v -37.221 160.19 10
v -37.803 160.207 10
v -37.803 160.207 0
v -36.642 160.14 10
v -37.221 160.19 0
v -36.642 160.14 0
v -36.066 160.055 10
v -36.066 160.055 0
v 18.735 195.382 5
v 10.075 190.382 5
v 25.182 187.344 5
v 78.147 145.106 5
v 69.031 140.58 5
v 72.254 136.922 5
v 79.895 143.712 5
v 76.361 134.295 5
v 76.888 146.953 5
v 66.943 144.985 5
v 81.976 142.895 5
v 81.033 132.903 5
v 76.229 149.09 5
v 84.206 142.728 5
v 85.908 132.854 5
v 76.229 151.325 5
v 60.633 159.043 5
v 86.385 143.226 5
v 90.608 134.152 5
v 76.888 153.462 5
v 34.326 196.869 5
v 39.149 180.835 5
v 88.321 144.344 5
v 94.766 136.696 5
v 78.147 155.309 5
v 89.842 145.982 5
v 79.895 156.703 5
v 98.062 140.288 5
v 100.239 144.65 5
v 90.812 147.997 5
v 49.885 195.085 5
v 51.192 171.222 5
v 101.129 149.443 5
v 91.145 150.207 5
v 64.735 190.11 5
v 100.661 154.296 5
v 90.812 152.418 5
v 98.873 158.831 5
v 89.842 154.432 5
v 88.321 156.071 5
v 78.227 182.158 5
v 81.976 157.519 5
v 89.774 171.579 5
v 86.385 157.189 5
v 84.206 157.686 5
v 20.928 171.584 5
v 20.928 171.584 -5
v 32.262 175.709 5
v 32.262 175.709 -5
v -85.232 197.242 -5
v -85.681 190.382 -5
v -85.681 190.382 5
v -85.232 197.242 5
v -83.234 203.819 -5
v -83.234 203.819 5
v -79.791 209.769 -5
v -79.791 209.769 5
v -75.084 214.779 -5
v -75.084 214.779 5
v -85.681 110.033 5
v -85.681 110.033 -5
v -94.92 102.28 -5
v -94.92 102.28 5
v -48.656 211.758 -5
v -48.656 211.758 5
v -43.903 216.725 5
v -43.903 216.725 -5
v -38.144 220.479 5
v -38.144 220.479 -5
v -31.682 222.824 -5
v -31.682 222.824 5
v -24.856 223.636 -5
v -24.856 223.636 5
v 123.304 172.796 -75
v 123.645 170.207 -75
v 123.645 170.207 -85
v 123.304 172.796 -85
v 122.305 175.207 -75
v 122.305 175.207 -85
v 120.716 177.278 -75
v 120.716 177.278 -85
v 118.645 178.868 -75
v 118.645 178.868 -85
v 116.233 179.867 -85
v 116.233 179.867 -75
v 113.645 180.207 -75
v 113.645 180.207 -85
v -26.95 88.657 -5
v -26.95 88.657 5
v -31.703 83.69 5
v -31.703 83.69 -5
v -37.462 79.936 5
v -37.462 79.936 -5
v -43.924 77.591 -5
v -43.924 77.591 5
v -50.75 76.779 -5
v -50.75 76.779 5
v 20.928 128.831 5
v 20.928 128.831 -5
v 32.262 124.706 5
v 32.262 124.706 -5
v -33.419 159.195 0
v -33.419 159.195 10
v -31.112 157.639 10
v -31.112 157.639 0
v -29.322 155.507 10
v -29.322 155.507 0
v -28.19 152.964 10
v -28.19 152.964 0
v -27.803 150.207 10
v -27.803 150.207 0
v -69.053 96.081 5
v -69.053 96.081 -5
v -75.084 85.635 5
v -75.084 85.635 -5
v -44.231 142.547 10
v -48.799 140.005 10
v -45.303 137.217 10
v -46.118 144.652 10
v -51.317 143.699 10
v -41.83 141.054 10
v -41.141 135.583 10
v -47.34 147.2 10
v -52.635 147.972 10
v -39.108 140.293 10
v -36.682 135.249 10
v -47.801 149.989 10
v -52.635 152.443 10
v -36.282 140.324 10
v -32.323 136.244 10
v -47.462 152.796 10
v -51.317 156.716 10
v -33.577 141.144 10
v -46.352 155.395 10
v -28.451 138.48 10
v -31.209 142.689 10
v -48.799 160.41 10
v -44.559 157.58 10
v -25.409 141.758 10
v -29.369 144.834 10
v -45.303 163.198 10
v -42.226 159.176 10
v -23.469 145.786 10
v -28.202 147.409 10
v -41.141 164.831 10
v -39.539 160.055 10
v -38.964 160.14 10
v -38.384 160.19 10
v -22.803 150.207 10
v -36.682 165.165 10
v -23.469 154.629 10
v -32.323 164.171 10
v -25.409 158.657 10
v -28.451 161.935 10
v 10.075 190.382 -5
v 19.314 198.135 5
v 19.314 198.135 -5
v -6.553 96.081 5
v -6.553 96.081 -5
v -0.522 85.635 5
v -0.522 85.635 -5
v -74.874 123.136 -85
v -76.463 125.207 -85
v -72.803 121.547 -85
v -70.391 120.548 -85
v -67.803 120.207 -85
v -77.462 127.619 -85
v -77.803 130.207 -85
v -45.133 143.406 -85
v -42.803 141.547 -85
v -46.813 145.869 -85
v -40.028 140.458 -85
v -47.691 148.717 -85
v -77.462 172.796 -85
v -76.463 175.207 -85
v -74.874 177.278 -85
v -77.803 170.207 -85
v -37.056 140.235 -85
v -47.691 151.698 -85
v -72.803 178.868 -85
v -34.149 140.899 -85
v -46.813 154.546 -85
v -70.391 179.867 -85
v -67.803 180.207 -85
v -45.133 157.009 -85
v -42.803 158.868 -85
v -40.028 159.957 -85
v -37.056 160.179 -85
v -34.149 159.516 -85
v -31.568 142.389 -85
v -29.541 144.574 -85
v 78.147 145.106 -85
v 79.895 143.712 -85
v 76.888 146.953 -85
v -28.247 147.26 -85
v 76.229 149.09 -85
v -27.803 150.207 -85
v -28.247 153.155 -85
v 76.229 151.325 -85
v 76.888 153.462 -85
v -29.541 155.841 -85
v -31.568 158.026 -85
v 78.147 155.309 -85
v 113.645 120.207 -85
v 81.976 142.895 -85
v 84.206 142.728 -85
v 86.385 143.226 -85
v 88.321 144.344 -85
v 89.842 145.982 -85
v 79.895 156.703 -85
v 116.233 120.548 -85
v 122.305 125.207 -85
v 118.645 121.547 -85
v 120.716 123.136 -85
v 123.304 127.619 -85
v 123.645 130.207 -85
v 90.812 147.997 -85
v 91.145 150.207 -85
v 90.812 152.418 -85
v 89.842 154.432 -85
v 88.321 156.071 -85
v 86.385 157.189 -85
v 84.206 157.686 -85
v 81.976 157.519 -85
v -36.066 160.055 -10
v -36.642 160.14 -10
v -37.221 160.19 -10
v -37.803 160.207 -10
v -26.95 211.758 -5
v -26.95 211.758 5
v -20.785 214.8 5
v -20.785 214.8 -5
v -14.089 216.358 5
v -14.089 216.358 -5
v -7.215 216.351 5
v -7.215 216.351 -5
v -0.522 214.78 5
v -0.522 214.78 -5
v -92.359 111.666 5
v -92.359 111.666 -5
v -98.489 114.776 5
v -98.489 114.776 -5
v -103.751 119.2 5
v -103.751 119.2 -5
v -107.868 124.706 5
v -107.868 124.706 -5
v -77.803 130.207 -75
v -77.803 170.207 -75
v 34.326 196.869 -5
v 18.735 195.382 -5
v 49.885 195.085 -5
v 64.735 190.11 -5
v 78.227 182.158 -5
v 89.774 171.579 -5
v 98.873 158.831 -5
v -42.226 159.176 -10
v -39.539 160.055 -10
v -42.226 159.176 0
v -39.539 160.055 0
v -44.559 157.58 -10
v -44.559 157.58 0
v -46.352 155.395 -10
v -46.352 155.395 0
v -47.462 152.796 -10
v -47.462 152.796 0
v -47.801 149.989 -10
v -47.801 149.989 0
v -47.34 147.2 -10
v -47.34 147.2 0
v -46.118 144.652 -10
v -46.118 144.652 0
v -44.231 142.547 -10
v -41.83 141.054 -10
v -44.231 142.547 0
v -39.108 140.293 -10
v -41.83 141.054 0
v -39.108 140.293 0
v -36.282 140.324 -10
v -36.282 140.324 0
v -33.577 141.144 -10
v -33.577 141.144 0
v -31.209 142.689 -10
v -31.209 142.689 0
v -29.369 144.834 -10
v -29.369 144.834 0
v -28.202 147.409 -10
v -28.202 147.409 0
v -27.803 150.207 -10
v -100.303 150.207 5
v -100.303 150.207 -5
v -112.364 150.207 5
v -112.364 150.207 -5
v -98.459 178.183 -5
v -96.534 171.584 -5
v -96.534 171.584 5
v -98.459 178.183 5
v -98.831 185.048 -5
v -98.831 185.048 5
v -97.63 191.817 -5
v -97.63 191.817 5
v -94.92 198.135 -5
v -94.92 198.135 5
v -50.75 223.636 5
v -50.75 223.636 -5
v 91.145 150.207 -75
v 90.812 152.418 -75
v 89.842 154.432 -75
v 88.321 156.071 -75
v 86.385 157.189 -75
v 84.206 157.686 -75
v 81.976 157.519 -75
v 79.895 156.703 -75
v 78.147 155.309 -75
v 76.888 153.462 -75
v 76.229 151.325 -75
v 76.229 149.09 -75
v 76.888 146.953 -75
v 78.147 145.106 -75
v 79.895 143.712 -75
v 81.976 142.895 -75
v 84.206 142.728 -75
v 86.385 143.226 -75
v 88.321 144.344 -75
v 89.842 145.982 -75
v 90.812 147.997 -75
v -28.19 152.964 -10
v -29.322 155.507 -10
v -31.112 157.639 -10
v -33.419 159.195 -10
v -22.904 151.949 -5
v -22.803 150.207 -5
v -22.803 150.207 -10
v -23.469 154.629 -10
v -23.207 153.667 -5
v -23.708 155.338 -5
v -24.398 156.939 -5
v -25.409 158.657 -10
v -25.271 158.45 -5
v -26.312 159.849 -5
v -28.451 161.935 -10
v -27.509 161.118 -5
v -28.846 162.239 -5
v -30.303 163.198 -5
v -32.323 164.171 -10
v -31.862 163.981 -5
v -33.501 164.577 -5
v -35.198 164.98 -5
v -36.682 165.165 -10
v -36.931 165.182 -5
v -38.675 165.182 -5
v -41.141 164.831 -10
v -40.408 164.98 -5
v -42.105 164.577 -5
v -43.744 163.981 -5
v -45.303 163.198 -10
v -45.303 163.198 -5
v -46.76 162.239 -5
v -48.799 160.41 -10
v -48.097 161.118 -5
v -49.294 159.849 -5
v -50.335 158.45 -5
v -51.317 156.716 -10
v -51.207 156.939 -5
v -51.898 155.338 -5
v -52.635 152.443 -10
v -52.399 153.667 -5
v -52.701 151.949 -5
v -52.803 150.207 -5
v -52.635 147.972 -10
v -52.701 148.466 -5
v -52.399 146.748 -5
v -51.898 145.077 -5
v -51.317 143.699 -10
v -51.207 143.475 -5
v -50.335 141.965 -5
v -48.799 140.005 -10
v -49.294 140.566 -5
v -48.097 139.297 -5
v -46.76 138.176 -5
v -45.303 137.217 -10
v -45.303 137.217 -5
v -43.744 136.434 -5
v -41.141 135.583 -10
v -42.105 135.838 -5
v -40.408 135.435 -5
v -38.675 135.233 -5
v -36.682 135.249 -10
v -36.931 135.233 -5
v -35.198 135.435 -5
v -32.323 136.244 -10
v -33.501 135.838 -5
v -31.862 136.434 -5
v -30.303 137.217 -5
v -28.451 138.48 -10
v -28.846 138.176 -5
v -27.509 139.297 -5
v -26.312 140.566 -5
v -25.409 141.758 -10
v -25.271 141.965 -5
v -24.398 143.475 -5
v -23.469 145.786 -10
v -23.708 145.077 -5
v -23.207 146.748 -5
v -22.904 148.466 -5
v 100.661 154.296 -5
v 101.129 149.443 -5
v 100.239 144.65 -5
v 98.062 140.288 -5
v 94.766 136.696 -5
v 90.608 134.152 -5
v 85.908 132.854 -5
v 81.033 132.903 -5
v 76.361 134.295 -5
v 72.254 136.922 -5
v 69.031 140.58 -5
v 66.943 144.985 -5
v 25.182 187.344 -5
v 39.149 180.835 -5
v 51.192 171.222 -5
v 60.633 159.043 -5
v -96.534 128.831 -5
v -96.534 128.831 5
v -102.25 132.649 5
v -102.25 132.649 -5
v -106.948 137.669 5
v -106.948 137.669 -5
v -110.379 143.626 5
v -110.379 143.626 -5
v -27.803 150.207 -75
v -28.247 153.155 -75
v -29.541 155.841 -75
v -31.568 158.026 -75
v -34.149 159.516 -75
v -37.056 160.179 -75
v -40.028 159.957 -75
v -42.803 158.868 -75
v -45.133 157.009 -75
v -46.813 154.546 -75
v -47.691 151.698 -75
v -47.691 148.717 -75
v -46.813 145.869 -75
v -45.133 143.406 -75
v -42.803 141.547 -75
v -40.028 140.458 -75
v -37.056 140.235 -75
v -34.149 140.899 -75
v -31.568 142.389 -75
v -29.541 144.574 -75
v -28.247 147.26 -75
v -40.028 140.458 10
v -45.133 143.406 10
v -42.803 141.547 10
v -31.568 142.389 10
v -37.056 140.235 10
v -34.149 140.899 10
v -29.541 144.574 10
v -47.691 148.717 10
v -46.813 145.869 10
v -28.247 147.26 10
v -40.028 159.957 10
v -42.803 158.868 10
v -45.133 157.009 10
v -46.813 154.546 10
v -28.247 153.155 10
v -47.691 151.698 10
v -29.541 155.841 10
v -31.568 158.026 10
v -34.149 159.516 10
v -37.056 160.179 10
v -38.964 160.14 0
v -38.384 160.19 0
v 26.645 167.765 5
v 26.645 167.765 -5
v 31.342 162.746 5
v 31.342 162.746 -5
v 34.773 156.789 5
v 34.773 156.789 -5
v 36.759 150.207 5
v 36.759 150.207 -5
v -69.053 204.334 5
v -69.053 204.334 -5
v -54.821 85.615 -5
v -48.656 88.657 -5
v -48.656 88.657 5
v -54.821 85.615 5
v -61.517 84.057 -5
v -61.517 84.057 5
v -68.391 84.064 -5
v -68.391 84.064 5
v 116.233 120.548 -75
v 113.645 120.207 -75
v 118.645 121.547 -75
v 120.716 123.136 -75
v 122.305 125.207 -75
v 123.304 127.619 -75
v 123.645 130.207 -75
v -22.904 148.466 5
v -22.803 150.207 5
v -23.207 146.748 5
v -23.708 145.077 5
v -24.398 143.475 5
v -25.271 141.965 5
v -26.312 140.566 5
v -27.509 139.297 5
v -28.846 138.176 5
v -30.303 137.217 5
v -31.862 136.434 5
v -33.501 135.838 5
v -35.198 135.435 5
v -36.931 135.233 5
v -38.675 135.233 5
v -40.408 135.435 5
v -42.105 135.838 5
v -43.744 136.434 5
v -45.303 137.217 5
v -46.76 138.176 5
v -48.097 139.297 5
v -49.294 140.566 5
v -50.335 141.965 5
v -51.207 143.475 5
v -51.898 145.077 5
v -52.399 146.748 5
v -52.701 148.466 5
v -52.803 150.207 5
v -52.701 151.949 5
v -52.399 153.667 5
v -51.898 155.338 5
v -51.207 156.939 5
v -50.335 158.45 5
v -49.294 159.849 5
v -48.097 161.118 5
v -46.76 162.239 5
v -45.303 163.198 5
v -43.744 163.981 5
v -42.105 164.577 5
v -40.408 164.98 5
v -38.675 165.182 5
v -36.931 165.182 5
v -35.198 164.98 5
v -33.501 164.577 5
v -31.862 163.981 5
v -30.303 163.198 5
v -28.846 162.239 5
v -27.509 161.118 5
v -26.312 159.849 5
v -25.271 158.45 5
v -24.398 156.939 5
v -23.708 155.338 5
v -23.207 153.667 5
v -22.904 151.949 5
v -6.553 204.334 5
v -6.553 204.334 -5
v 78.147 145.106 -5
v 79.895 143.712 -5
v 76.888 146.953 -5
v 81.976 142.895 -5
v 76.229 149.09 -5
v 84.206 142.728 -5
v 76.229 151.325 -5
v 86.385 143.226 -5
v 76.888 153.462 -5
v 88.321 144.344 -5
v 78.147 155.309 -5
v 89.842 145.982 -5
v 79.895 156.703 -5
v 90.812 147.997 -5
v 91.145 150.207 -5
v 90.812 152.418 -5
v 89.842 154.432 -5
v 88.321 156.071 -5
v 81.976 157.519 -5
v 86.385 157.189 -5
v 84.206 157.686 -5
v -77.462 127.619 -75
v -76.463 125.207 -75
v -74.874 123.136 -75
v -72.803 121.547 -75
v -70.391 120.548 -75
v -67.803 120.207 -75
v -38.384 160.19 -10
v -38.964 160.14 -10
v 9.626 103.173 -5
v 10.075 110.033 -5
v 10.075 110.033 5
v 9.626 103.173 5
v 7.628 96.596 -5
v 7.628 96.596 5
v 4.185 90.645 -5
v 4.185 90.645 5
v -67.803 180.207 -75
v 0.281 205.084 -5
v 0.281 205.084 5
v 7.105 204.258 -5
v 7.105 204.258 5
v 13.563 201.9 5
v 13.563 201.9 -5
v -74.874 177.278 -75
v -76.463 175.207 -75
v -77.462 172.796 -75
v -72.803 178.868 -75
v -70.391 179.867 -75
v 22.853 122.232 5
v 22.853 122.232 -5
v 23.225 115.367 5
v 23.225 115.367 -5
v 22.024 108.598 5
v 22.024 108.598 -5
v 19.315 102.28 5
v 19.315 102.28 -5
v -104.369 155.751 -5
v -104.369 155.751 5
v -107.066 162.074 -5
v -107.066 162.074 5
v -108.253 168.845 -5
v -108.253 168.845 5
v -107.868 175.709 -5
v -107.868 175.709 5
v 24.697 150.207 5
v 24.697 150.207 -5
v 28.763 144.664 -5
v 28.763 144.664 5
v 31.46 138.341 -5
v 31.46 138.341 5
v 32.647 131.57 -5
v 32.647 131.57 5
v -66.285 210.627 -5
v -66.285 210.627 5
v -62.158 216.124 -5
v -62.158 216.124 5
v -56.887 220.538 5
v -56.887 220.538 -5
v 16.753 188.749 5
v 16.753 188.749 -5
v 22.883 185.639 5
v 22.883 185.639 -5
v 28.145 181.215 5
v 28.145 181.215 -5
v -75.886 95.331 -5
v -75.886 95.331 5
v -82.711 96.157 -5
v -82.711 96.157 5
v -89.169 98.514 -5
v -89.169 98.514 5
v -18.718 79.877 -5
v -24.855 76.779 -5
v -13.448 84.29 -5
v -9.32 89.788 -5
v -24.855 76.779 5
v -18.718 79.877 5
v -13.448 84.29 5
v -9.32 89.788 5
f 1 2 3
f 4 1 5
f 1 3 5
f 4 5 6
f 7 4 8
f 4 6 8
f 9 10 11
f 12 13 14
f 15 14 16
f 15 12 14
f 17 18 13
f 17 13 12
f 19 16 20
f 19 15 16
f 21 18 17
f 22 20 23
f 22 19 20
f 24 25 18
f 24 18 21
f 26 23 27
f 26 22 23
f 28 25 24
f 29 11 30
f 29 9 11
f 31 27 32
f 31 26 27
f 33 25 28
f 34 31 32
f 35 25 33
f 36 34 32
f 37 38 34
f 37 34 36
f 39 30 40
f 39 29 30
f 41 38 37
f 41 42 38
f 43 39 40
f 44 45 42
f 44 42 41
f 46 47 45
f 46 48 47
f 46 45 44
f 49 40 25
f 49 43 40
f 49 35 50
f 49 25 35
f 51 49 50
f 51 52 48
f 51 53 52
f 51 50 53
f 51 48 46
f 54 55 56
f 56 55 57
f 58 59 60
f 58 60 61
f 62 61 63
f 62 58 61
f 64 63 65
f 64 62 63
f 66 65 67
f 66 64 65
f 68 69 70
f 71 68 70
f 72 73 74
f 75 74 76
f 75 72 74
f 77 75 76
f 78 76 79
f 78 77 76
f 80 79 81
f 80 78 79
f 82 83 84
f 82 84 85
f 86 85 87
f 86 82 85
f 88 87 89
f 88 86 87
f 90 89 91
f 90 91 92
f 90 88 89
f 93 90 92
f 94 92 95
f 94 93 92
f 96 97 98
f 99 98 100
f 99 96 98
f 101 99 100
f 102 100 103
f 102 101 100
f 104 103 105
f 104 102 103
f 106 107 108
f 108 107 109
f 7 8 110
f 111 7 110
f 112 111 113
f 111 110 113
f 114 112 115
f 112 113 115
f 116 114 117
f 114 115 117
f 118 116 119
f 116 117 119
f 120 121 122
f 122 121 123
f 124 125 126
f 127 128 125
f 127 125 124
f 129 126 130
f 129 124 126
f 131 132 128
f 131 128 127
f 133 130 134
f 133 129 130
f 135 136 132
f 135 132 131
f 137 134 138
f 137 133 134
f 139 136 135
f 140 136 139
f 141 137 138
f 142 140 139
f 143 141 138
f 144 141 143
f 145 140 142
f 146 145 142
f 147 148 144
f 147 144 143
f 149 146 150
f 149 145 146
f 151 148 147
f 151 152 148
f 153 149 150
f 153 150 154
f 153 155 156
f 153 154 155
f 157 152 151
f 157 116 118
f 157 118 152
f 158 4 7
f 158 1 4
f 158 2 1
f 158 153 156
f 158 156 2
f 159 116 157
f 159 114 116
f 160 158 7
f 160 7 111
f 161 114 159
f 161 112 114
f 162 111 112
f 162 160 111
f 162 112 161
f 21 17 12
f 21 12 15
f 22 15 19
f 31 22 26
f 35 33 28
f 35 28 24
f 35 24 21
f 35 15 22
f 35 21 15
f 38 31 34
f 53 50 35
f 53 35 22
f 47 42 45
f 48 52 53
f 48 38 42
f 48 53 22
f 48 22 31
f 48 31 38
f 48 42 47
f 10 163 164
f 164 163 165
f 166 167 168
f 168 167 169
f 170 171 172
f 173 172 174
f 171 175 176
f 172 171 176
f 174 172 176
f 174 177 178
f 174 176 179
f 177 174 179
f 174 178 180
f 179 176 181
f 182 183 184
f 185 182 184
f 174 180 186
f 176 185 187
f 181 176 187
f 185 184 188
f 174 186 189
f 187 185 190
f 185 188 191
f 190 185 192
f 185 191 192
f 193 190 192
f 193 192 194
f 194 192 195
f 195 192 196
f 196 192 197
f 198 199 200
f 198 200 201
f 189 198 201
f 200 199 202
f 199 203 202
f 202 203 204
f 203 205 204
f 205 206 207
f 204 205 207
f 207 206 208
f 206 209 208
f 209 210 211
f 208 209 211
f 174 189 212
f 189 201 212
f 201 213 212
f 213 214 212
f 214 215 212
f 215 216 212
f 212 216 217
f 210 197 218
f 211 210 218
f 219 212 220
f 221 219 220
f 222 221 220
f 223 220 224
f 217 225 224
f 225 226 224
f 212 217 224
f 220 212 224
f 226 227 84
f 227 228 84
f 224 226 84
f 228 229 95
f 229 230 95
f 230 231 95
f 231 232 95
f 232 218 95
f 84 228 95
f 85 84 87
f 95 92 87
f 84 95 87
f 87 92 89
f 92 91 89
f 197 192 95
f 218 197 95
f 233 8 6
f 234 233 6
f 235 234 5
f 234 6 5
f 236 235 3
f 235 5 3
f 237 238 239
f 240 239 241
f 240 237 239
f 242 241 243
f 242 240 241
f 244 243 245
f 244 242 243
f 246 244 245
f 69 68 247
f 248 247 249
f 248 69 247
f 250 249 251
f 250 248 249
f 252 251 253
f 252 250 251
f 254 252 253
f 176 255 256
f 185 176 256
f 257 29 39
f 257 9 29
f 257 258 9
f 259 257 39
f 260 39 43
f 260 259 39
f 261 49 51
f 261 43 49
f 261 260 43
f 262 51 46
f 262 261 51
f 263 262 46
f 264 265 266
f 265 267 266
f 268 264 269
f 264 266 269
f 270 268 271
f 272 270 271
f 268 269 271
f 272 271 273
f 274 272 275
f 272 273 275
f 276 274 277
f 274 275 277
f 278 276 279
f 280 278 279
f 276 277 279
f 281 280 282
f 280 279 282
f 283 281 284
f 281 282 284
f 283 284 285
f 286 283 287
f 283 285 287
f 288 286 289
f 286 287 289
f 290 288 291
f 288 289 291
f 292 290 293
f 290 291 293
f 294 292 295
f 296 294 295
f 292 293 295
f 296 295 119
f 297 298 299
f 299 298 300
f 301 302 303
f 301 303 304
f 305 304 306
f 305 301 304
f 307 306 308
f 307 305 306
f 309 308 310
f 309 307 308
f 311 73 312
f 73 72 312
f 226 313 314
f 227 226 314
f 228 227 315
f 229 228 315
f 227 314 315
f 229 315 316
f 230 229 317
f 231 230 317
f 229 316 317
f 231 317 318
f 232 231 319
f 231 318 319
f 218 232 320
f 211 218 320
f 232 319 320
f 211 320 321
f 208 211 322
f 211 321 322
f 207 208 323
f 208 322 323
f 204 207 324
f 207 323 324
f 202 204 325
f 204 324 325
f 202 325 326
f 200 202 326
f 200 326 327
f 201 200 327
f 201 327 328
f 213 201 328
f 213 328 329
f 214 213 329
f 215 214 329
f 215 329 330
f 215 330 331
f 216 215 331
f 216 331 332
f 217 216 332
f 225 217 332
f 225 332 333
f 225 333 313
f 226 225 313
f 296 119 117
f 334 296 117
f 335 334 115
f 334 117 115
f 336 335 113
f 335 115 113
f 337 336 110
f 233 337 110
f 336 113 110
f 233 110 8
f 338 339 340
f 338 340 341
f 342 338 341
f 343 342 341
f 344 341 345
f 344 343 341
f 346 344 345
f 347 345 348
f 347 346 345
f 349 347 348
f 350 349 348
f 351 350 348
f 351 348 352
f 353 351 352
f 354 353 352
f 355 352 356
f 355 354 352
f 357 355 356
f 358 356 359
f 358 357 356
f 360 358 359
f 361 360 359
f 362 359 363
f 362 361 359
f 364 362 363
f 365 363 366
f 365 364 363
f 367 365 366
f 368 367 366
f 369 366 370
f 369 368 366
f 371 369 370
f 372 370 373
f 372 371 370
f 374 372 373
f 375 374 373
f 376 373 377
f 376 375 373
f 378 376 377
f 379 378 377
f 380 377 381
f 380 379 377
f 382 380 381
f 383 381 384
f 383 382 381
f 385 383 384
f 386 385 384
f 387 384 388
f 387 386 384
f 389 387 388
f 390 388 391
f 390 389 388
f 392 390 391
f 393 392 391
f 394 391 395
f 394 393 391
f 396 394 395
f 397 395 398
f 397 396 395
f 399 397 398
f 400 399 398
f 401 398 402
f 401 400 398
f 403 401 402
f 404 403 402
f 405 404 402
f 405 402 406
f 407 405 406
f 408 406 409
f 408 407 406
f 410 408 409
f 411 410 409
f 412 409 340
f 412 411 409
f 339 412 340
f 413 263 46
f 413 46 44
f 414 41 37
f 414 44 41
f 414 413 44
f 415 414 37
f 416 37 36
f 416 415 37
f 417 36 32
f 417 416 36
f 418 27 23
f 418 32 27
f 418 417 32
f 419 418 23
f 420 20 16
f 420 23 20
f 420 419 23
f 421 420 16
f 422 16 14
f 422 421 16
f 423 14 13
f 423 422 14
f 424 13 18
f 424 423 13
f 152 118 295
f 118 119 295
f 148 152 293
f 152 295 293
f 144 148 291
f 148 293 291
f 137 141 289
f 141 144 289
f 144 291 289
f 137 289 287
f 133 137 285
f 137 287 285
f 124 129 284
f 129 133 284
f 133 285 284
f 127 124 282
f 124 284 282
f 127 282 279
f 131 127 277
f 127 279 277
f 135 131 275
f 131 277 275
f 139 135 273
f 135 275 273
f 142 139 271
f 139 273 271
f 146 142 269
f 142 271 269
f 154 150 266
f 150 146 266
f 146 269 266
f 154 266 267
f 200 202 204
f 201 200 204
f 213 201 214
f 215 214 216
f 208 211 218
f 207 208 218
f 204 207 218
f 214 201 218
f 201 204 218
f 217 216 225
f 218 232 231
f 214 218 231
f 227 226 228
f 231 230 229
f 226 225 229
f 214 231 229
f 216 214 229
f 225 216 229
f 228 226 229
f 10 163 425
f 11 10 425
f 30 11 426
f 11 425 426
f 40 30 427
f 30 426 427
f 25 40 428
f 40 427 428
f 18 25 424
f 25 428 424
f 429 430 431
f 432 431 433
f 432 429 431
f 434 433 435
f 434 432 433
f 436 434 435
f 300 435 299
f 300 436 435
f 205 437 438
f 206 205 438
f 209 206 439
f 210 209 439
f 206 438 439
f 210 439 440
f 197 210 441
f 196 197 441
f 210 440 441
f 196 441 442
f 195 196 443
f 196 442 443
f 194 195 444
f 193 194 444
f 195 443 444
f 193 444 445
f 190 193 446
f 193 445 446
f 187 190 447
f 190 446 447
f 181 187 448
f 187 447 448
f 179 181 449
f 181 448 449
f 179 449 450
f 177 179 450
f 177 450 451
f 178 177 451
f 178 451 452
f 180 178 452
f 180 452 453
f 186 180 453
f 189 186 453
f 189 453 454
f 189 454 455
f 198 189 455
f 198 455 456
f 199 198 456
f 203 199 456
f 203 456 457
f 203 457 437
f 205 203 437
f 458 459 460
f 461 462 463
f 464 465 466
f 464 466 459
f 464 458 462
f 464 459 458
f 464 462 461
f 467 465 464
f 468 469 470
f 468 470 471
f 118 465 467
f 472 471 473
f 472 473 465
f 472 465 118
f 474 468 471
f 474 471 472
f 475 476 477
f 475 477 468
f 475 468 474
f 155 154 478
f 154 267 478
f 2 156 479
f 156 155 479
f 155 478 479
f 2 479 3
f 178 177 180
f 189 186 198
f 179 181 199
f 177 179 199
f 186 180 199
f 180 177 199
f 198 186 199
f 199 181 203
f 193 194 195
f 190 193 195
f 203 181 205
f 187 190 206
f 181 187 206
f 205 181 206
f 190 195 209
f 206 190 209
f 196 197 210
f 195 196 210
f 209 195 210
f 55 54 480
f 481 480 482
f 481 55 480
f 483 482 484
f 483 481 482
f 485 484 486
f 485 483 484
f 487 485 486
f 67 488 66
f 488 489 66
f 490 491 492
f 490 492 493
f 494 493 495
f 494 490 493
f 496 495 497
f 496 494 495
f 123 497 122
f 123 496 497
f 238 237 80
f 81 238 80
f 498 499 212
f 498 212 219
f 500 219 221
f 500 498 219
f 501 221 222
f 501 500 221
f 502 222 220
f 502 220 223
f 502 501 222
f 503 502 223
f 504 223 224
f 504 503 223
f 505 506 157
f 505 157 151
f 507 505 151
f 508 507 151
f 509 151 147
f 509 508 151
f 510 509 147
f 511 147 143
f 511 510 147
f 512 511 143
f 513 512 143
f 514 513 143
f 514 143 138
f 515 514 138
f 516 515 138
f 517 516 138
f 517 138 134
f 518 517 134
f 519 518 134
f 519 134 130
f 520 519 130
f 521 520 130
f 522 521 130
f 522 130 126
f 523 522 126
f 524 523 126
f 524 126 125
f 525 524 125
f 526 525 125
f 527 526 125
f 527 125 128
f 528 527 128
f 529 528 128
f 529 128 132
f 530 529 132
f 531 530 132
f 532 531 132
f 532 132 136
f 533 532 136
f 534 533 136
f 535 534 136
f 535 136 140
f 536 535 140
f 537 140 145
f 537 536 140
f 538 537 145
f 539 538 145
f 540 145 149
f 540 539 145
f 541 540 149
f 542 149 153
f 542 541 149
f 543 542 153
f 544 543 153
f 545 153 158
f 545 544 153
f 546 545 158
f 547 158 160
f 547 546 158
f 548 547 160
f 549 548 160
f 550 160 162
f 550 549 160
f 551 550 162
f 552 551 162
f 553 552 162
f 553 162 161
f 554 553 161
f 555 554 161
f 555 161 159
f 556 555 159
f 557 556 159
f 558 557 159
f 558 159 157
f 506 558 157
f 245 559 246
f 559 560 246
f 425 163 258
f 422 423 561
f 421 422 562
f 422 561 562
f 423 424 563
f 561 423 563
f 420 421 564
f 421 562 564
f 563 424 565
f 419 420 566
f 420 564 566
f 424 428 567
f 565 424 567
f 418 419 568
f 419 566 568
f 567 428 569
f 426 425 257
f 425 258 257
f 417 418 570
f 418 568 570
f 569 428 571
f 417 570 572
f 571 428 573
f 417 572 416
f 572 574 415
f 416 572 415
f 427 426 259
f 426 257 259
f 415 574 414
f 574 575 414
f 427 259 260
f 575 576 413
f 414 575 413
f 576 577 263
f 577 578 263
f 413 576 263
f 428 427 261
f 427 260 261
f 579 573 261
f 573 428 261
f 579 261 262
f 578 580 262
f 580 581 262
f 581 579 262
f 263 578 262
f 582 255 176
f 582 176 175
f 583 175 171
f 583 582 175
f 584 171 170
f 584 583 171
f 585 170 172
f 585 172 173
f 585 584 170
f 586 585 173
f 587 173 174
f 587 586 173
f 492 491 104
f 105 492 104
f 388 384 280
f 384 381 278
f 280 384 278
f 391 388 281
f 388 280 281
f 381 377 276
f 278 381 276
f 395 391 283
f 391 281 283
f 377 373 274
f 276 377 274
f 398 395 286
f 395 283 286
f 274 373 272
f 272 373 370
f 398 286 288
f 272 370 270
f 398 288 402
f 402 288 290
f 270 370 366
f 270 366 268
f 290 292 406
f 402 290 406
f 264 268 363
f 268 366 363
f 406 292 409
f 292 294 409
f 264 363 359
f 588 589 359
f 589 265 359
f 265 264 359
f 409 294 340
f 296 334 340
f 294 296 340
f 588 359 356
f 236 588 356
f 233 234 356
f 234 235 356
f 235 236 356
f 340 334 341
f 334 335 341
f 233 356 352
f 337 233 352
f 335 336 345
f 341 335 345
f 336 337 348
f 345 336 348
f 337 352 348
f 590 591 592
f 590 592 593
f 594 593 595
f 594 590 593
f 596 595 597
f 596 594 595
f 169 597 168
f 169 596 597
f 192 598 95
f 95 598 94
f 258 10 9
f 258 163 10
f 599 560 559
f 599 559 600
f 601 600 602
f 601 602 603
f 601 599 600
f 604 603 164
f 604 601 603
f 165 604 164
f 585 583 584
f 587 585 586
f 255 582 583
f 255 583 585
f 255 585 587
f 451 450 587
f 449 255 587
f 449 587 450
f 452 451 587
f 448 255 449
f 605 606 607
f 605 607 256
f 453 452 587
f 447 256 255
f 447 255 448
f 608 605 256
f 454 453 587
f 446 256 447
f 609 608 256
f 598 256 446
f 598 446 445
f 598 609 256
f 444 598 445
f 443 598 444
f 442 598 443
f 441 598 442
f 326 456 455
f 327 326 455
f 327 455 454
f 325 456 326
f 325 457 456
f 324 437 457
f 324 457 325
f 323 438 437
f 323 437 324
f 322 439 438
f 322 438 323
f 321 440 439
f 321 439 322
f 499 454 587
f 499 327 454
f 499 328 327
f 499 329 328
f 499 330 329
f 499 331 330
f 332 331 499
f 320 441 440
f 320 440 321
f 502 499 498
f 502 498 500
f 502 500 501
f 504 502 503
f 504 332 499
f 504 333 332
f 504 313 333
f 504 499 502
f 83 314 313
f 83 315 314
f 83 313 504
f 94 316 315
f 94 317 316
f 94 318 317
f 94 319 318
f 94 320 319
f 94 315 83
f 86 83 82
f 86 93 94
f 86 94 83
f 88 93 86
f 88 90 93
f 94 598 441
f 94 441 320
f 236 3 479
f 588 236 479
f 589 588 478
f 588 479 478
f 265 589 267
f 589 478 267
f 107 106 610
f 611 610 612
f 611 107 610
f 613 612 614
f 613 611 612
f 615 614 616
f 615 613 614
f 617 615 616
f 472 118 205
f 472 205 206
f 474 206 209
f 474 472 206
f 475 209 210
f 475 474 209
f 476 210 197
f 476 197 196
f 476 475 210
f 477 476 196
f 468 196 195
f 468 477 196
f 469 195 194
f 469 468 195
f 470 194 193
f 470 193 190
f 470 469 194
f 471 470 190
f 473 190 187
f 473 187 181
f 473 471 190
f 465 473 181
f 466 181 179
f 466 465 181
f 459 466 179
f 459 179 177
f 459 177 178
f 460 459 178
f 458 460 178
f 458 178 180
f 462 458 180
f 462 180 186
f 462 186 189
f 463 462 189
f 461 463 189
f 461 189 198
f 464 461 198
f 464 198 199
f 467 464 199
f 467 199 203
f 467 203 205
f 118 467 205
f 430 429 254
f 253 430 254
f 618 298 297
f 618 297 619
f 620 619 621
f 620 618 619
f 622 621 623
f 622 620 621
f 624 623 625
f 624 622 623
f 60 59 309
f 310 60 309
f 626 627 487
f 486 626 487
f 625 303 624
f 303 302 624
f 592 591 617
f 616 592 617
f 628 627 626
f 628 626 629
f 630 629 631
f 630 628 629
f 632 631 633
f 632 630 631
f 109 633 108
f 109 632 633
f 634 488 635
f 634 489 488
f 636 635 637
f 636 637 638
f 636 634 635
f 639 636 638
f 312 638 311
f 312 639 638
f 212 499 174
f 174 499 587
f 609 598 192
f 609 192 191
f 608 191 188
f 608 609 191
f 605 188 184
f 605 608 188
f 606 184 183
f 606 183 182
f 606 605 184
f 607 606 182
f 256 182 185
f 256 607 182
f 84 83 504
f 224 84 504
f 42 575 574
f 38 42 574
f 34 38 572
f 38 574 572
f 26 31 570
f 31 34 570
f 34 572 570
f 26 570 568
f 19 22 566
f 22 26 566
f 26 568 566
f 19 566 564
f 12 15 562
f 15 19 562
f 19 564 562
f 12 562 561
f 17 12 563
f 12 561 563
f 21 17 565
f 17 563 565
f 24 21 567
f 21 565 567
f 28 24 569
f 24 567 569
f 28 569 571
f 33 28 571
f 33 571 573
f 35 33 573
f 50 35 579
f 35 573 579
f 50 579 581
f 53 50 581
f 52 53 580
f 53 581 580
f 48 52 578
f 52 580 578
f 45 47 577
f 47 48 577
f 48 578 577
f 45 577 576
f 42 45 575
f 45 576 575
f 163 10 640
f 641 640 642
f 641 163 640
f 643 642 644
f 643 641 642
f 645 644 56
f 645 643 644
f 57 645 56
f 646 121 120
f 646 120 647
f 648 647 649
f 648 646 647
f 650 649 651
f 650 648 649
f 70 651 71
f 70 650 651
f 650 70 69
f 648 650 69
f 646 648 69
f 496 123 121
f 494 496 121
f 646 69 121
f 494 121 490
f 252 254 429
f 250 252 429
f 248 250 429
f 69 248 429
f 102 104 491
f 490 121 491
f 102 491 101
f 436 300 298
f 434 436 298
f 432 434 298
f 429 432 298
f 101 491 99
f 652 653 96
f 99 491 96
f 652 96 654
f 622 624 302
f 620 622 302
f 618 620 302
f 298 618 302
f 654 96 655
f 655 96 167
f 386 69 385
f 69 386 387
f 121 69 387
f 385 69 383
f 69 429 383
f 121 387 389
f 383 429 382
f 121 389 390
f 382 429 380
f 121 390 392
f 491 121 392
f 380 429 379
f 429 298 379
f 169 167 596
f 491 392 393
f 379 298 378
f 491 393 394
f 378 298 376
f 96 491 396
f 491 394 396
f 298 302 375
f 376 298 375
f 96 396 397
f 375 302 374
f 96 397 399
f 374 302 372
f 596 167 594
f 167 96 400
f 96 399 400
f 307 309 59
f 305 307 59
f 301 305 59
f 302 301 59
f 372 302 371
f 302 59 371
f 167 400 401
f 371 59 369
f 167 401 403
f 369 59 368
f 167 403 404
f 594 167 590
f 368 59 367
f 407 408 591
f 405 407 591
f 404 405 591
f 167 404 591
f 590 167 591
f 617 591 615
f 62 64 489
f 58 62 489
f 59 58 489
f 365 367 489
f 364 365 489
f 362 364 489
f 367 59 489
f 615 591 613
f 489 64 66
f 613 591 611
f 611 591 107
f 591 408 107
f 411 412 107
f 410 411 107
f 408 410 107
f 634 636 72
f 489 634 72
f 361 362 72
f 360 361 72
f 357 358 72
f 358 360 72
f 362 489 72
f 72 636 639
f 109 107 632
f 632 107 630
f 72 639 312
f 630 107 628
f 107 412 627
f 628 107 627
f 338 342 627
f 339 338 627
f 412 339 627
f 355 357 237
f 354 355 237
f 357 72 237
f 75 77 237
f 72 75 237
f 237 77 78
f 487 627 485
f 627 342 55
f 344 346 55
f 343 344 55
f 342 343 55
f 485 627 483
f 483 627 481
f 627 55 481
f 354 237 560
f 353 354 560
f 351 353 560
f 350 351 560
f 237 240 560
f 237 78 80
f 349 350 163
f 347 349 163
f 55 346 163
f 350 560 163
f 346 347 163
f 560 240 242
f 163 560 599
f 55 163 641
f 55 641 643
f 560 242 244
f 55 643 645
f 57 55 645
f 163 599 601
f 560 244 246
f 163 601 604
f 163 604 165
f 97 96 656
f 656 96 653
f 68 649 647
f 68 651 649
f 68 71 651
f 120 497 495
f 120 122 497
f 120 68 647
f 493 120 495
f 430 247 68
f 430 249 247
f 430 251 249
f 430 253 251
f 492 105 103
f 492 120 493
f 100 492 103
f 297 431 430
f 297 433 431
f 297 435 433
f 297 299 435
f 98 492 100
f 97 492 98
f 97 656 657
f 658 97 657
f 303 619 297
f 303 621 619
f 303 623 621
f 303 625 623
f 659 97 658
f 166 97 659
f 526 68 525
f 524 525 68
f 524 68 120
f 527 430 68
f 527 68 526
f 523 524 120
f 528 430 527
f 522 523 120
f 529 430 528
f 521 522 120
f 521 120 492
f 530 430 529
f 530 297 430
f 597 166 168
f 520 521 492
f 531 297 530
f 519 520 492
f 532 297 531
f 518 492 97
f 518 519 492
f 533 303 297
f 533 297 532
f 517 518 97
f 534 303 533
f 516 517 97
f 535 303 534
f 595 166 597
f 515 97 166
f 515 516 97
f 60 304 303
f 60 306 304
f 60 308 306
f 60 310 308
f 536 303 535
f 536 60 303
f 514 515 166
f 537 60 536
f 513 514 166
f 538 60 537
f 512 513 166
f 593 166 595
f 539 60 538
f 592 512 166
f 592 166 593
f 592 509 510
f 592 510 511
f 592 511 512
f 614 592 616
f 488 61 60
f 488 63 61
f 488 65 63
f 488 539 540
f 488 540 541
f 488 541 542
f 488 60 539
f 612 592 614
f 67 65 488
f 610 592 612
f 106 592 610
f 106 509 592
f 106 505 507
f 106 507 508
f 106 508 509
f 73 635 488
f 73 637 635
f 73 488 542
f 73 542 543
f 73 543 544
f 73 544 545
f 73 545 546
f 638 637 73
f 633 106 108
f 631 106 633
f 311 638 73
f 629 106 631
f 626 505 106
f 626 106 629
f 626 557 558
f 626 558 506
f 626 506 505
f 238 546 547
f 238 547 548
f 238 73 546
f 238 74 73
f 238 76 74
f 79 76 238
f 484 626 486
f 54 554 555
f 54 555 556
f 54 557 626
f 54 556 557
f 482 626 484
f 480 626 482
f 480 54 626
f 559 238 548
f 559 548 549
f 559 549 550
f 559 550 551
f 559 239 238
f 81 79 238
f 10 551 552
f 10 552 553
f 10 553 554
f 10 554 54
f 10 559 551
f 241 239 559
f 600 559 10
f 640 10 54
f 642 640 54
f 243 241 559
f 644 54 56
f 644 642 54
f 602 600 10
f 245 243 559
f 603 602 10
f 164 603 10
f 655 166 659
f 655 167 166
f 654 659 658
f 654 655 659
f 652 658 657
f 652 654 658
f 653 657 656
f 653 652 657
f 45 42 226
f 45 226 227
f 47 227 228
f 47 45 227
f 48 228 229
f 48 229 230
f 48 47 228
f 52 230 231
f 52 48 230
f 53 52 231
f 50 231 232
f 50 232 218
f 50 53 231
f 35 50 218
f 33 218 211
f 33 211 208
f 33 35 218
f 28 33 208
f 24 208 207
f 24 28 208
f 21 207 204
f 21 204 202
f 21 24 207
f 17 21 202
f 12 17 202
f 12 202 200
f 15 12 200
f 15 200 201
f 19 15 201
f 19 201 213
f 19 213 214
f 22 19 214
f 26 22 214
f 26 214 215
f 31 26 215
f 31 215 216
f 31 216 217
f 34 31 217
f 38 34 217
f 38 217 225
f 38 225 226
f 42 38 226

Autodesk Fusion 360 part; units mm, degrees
sketch "Sketch1" plane through (0, 0, 0) normal (0, 0, 1) x (1, 0, 0)
  circle A0 centre (-37.8029, 150.2074) radius 62.5
  circle A1 centre (-37.8029, 150.2074) radius 75
  line L0 (-37.8029, 150.2074) -> (-37.8029, 225.2074)
  line L1 (-37.8029, 150.2074) -> (-48.6559, 211.7579)
  line L2 (-37.8029, 150.2074) -> (24.6971, 150.2074) construction
  line L3 (-37.8029, 150.2074) -> (-24.8555, 223.6361)
  line L4 (-37.8029, 150.2074) -> (37.1971, 150.2074) construction
  arc A2 (-24.8555, 223.6361) -> (-48.6559, 211.7579) centre (-24.7476, 193.6363) ccw
  circle A3 centre (-37.8029, 150.2074) radius 15
  circle A4 centre (-37.8029, 150.2074) radius 10
  dimension "d1" = 125
  dimension "d2" = 12.5
  dimension "d3" = 100
  dimension "d4" = 62.5
  dimension "d5" = 80
  dimension "d6" = 30
  dimension "d8" = 30
  dimension "d9" = 20
extrude "Extrude1" add sketch "Sketch1" along normal mid plane 10 contours A0 L0 A2 | A0 L0 L1 A3 | A0 L0 L3 A2 | A0 L0 L3 A3 makes body 1
pattern_circular "C-Pattern1" count 18 over 360 about axis through (-37.8029, 150.2074, 5) along (0, 0, -1) of bodies 1 makes body 2 at (-19.2583, 196.5784, 5) makes body 3 at (-4.5169, 187.4393, 5) makes body 4 at (6.2097, 173.8094, -5) makes body 5 at (11.6278, 157.3328, 5) makes body 6 at (11.0838, 139.9968, 5) makes body 7 at (4.6434, 123.8923, 5) makes body 8 at (-6.9168, 110.9619, 5) makes body 9 at (-22.2022, 102.765, 5) makes body 10 at (-39.3693, 100.2903, 5) makes body 11 at (-56.3475, 103.8364, 5) makes body 12 at (-71.0889, 112.9756, -5) makes body 13 at (-81.8156, 126.6054, 5) makes body 14 at (-87.2337, 143.082, 5) makes body 15 at (-86.6897, 160.418, 5) makes body 16 at (-80.2492, 176.5225, 5) makes body 17 at (-68.6891, 189.453, 5) makes body 18 at (-53.4036, 197.6499, 5)
extrude "Extrude2" add sketch "Sketch1" along normal mid plane 20 contours L0 L1 A3 A4 | L1 L3 A3 A4 | L0 L3 A3 A4 bodies 1 2 3 4 5 6 7 8 9 10 11 12 13 14 15 16 17 18
copy_body "Body->Comp1" bodies 1 removing the originals makes body 19 in component "Component"
sketch "Sketch2" plane through (0, 0, 0) normal (0, 0, 1) x (1, 0, 0)
  circle A0 centre (-37.8029, 150.2074) radius 10
  circle A1 centre (-37.8029, 150.2074) radius 15
  line L0 (-48.6559, 211.7579) -> (-50.7504, 223.6361)
  arc A2 (-50.7504, 223.6361) -> (-69.0529, 204.334) centre (-40.3885, 195.4824) ccw
  line L1 (-69.0529, 204.334) -> (-75.0836, 214.7795)
  arc A3 (-75.0836, 214.7795) -> (-85.6807, 190.3817) centre (-55.7175, 191.8677) ccw
  line L2 (-85.6807, 190.3817) -> (-94.9203, 198.1346)
  arc A4 (-94.9203, 198.1346) -> (-96.5337, 171.5837) centre (-68.8858, 183.2281) ccw
  line L3 (-96.5337, 171.5837) -> (-107.8678, 175.7089)
  arc A5 (-107.8678, 175.7089) -> (-100.3029, 150.2074) centre (-78.305, 170.6057) ccw
  line L4 (-100.3029, 150.2074) -> (-112.3644, 150.2074)
  arc A6 (-112.3644, 150.2074) -> (-96.5337, 128.8312) centre (-82.839, 155.523) ccw
  line L5 (-96.5337, 128.8312) -> (-107.8678, 124.7059)
  arc A7 (-107.8678, 124.7059) -> (-85.6807, 110.0332) centre (-81.9411, 139.7992) ccw
  line L6 (-85.6807, 110.0332) -> (-94.9203, 102.2803)
  arc A8 (-94.9203, 102.2803) -> (-69.0529, 96.0808) centre (-75.7194, 125.3308) ccw
  line L7 (-69.0529, 96.0808) -> (-75.0836, 85.6353)
  arc A9 (-75.0836, 85.6353) -> (-48.6559, 88.6569) centre (-64.9244, 113.8628) ccw
  line L8 (-48.6559, 88.6569) -> (-50.7504, 76.7787)
  arc A10 (-50.7504, 76.7787) -> (-26.9499, 88.6569) centre (-50.8582, 106.7785) ccw
  line L9 (-26.9499, 88.6569) -> (-24.8555, 76.7787)
  arc A11 (-24.8555, 76.7787) -> (-6.5529, 96.0808) centre (-35.2173, 104.9325) ccw
  line L10 (-6.5529, 96.0808) -> (-0.5222, 85.6353)
  arc A12 (-0.5222, 85.6353) -> (10.0749, 110.0332) centre (-19.8883, 108.5472) ccw
  line L11 (10.0749, 110.0332) -> (19.3145, 102.2803)
  arc A13 (19.3145, 102.2803) -> (20.9279, 128.8312) centre (-6.7201, 117.1868) ccw
  line L12 (20.9279, 128.8312) -> (32.2619, 124.7059)
  arc A14 (32.2619, 124.7059) -> (24.6971, 150.2074) centre (2.6991, 129.8091) ccw
  line L13 (24.6971, 150.2074) -> (36.7585, 150.2074)
  arc A15 (36.7585, 150.2074) -> (20.9279, 171.5837) centre (7.2332, 144.8918) ccw
  line L14 (20.9279, 171.5837) -> (32.2619, 175.7089)
  arc A16 (32.2619, 175.7089) -> (10.0749, 190.3817) centre (6.3352, 160.6156) ccw
  line L15 (10.0749, 190.3817) -> (19.3145, 198.1346)
  arc A17 (19.3145, 198.1346) -> (-6.5529, 204.334) centre (0.1136, 175.0841) ccw
  line L16 (-6.5529, 204.334) -> (-0.5222, 214.7795)
  arc A18 (-0.5222, 214.7795) -> (-26.9499, 211.7579) centre (-10.6814, 186.552) ccw
  line L17 (-26.9499, 211.7579) -> (-24.8555, 223.6361)
  arc A19 (-24.8555, 223.6361) -> (-48.6559, 211.7579) centre (-24.7476, 193.6363) ccw
  circle A20 centre (83.6452, 150.2074) radius 17.5
  arc A21 (66.9426, 144.985) -> (10.0749, 190.3817) centre (4.9044, 125.5876) ccw
  circle A22 centre (83.6452, 150.2074) radius 7.5
  line L18 (10.0749, 190.3817) -> (18.7351, 195.3817)
  line L19 (10.0749, 190.3817) -> (20.0749, 190.3817) construction
  arc A23 (98.8728, 158.8313) -> (18.7351, 195.3817) centre (33.6117, 121.8719) ccw
  dimension "d16" = 35
  dimension "d17" = 65
  dimension "d19" = 15
  dimension "d44" = 30
  dimension "d45" = 10
  dimension "d46" = 75
extrude "Extrude1'" add sketch "Sketch2" along normal mid plane 10 separate body contours A20 A21 L18 A23 | A20 makes body 20 in component "Component'"
sketch "Sketch3" plane through (0, 0, 5) normal (0, 0, 1) x (1, 0, 0)
  circle A0 centre (83.6452, 150.2074) radius 7.5
  line L0 (-67.8029, 180.2074) -> (113.6452, 180.2074)
  line L1 (123.6452, 170.2074) -> (123.6452, 130.2074)
  line L2 (113.6452, 120.2074) -> (-67.8029, 120.2074)
  line L3 (-77.8029, 130.2074) -> (-77.8029, 170.2074)
  circle A1 centre (-37.8029, 150.2074) radius 10
  circle A2 centre (83.6452, 150.2074) radius 7.5
  arc A3 (-67.8029, 180.2074) -> (-77.8029, 170.2074) centre (-67.8029, 170.2074) ccw
  arc A4 (-77.8029, 130.2074) -> (-67.8029, 120.2074) centre (-67.8029, 130.2074) ccw
  arc A5 (123.6452, 170.2074) -> (113.6452, 180.2074) centre (113.6452, 170.2074) ccw
  arc A6 (113.6452, 120.2074) -> (123.6452, 130.2074) centre (113.6452, 130.2074) ccw
  arc A7 (66.9426, 144.985) -> (98.8728, 158.8313) centre (83.6452, 150.2074) ccw
  arc A8 (98.8728, 158.8313) -> (18.7351, 195.3817) centre (33.6117, 121.8719) ccw
  line L4 (18.7351, 195.3817) -> (10.0749, 190.3817)
  arc A9 (66.9426, 144.985) -> (10.0749, 190.3817) centre (4.9044, 125.5876) ccw
  dimension "d22" = 40
  dimension "d23" = 30
  dimension "d24" = 30
  dimension "d25" = 40
  dimension "d26" = 10
extrude "Extrude3" add sketch "Sketch3" against normal blind 10 from surface at -80 separate body contours L0 L1 L2 L3 A3 A4 A5 A6 A7 A8 A9 | L0 A7 A8 A9 makes body 21
copy_body "Body->Comp2" bodies 21 removing the originals makes body 22 in component "Component''"
extrude "Extrude1''" add sketch "Sketch3" against normal blind 90 separate body contours A0 A2 | A1 makes body 23 at (90.9133, 152.0581, -55) makes body 24 at (-27.8154, 149.709, -55) in component "Component'''"
move_face "OffsetFaces1" offset 5 1 faces at (-40.9509, 149.7217, 5) on bodies 24 in component "Component'''"
copy_body "Body->Comp1'" bodies 23 removing the originals makes body 25 in component "Component''''"
copy_body "Body->Comp2'" bodies 24 removing the originals makes body 26 in component "Component'''''"
component "Component" placed x (1, 0, 0) y (0, 1, 0) z (0, 0, 1) at (0, 0, 0)
component "Component'" placed x (1, 0, 0) y (0, 1, 0) z (0, 0, 1) at (0, 0, 0)
component "Component''" placed x (1, 0, 0) y (0, 1, 0) z (0, 0, 1) at (0, 0, 0)
component "Component'''''" placed x (1, 0, 0) y (0, 1, 0) z (0, 0, 1) at (0, 0, 0) in component "Component''"
component "Component''''" placed x (1, 0, 0) y (0, 1, 0) z (0, 0, 1) at (0, 0, 0) in component "Component''"
